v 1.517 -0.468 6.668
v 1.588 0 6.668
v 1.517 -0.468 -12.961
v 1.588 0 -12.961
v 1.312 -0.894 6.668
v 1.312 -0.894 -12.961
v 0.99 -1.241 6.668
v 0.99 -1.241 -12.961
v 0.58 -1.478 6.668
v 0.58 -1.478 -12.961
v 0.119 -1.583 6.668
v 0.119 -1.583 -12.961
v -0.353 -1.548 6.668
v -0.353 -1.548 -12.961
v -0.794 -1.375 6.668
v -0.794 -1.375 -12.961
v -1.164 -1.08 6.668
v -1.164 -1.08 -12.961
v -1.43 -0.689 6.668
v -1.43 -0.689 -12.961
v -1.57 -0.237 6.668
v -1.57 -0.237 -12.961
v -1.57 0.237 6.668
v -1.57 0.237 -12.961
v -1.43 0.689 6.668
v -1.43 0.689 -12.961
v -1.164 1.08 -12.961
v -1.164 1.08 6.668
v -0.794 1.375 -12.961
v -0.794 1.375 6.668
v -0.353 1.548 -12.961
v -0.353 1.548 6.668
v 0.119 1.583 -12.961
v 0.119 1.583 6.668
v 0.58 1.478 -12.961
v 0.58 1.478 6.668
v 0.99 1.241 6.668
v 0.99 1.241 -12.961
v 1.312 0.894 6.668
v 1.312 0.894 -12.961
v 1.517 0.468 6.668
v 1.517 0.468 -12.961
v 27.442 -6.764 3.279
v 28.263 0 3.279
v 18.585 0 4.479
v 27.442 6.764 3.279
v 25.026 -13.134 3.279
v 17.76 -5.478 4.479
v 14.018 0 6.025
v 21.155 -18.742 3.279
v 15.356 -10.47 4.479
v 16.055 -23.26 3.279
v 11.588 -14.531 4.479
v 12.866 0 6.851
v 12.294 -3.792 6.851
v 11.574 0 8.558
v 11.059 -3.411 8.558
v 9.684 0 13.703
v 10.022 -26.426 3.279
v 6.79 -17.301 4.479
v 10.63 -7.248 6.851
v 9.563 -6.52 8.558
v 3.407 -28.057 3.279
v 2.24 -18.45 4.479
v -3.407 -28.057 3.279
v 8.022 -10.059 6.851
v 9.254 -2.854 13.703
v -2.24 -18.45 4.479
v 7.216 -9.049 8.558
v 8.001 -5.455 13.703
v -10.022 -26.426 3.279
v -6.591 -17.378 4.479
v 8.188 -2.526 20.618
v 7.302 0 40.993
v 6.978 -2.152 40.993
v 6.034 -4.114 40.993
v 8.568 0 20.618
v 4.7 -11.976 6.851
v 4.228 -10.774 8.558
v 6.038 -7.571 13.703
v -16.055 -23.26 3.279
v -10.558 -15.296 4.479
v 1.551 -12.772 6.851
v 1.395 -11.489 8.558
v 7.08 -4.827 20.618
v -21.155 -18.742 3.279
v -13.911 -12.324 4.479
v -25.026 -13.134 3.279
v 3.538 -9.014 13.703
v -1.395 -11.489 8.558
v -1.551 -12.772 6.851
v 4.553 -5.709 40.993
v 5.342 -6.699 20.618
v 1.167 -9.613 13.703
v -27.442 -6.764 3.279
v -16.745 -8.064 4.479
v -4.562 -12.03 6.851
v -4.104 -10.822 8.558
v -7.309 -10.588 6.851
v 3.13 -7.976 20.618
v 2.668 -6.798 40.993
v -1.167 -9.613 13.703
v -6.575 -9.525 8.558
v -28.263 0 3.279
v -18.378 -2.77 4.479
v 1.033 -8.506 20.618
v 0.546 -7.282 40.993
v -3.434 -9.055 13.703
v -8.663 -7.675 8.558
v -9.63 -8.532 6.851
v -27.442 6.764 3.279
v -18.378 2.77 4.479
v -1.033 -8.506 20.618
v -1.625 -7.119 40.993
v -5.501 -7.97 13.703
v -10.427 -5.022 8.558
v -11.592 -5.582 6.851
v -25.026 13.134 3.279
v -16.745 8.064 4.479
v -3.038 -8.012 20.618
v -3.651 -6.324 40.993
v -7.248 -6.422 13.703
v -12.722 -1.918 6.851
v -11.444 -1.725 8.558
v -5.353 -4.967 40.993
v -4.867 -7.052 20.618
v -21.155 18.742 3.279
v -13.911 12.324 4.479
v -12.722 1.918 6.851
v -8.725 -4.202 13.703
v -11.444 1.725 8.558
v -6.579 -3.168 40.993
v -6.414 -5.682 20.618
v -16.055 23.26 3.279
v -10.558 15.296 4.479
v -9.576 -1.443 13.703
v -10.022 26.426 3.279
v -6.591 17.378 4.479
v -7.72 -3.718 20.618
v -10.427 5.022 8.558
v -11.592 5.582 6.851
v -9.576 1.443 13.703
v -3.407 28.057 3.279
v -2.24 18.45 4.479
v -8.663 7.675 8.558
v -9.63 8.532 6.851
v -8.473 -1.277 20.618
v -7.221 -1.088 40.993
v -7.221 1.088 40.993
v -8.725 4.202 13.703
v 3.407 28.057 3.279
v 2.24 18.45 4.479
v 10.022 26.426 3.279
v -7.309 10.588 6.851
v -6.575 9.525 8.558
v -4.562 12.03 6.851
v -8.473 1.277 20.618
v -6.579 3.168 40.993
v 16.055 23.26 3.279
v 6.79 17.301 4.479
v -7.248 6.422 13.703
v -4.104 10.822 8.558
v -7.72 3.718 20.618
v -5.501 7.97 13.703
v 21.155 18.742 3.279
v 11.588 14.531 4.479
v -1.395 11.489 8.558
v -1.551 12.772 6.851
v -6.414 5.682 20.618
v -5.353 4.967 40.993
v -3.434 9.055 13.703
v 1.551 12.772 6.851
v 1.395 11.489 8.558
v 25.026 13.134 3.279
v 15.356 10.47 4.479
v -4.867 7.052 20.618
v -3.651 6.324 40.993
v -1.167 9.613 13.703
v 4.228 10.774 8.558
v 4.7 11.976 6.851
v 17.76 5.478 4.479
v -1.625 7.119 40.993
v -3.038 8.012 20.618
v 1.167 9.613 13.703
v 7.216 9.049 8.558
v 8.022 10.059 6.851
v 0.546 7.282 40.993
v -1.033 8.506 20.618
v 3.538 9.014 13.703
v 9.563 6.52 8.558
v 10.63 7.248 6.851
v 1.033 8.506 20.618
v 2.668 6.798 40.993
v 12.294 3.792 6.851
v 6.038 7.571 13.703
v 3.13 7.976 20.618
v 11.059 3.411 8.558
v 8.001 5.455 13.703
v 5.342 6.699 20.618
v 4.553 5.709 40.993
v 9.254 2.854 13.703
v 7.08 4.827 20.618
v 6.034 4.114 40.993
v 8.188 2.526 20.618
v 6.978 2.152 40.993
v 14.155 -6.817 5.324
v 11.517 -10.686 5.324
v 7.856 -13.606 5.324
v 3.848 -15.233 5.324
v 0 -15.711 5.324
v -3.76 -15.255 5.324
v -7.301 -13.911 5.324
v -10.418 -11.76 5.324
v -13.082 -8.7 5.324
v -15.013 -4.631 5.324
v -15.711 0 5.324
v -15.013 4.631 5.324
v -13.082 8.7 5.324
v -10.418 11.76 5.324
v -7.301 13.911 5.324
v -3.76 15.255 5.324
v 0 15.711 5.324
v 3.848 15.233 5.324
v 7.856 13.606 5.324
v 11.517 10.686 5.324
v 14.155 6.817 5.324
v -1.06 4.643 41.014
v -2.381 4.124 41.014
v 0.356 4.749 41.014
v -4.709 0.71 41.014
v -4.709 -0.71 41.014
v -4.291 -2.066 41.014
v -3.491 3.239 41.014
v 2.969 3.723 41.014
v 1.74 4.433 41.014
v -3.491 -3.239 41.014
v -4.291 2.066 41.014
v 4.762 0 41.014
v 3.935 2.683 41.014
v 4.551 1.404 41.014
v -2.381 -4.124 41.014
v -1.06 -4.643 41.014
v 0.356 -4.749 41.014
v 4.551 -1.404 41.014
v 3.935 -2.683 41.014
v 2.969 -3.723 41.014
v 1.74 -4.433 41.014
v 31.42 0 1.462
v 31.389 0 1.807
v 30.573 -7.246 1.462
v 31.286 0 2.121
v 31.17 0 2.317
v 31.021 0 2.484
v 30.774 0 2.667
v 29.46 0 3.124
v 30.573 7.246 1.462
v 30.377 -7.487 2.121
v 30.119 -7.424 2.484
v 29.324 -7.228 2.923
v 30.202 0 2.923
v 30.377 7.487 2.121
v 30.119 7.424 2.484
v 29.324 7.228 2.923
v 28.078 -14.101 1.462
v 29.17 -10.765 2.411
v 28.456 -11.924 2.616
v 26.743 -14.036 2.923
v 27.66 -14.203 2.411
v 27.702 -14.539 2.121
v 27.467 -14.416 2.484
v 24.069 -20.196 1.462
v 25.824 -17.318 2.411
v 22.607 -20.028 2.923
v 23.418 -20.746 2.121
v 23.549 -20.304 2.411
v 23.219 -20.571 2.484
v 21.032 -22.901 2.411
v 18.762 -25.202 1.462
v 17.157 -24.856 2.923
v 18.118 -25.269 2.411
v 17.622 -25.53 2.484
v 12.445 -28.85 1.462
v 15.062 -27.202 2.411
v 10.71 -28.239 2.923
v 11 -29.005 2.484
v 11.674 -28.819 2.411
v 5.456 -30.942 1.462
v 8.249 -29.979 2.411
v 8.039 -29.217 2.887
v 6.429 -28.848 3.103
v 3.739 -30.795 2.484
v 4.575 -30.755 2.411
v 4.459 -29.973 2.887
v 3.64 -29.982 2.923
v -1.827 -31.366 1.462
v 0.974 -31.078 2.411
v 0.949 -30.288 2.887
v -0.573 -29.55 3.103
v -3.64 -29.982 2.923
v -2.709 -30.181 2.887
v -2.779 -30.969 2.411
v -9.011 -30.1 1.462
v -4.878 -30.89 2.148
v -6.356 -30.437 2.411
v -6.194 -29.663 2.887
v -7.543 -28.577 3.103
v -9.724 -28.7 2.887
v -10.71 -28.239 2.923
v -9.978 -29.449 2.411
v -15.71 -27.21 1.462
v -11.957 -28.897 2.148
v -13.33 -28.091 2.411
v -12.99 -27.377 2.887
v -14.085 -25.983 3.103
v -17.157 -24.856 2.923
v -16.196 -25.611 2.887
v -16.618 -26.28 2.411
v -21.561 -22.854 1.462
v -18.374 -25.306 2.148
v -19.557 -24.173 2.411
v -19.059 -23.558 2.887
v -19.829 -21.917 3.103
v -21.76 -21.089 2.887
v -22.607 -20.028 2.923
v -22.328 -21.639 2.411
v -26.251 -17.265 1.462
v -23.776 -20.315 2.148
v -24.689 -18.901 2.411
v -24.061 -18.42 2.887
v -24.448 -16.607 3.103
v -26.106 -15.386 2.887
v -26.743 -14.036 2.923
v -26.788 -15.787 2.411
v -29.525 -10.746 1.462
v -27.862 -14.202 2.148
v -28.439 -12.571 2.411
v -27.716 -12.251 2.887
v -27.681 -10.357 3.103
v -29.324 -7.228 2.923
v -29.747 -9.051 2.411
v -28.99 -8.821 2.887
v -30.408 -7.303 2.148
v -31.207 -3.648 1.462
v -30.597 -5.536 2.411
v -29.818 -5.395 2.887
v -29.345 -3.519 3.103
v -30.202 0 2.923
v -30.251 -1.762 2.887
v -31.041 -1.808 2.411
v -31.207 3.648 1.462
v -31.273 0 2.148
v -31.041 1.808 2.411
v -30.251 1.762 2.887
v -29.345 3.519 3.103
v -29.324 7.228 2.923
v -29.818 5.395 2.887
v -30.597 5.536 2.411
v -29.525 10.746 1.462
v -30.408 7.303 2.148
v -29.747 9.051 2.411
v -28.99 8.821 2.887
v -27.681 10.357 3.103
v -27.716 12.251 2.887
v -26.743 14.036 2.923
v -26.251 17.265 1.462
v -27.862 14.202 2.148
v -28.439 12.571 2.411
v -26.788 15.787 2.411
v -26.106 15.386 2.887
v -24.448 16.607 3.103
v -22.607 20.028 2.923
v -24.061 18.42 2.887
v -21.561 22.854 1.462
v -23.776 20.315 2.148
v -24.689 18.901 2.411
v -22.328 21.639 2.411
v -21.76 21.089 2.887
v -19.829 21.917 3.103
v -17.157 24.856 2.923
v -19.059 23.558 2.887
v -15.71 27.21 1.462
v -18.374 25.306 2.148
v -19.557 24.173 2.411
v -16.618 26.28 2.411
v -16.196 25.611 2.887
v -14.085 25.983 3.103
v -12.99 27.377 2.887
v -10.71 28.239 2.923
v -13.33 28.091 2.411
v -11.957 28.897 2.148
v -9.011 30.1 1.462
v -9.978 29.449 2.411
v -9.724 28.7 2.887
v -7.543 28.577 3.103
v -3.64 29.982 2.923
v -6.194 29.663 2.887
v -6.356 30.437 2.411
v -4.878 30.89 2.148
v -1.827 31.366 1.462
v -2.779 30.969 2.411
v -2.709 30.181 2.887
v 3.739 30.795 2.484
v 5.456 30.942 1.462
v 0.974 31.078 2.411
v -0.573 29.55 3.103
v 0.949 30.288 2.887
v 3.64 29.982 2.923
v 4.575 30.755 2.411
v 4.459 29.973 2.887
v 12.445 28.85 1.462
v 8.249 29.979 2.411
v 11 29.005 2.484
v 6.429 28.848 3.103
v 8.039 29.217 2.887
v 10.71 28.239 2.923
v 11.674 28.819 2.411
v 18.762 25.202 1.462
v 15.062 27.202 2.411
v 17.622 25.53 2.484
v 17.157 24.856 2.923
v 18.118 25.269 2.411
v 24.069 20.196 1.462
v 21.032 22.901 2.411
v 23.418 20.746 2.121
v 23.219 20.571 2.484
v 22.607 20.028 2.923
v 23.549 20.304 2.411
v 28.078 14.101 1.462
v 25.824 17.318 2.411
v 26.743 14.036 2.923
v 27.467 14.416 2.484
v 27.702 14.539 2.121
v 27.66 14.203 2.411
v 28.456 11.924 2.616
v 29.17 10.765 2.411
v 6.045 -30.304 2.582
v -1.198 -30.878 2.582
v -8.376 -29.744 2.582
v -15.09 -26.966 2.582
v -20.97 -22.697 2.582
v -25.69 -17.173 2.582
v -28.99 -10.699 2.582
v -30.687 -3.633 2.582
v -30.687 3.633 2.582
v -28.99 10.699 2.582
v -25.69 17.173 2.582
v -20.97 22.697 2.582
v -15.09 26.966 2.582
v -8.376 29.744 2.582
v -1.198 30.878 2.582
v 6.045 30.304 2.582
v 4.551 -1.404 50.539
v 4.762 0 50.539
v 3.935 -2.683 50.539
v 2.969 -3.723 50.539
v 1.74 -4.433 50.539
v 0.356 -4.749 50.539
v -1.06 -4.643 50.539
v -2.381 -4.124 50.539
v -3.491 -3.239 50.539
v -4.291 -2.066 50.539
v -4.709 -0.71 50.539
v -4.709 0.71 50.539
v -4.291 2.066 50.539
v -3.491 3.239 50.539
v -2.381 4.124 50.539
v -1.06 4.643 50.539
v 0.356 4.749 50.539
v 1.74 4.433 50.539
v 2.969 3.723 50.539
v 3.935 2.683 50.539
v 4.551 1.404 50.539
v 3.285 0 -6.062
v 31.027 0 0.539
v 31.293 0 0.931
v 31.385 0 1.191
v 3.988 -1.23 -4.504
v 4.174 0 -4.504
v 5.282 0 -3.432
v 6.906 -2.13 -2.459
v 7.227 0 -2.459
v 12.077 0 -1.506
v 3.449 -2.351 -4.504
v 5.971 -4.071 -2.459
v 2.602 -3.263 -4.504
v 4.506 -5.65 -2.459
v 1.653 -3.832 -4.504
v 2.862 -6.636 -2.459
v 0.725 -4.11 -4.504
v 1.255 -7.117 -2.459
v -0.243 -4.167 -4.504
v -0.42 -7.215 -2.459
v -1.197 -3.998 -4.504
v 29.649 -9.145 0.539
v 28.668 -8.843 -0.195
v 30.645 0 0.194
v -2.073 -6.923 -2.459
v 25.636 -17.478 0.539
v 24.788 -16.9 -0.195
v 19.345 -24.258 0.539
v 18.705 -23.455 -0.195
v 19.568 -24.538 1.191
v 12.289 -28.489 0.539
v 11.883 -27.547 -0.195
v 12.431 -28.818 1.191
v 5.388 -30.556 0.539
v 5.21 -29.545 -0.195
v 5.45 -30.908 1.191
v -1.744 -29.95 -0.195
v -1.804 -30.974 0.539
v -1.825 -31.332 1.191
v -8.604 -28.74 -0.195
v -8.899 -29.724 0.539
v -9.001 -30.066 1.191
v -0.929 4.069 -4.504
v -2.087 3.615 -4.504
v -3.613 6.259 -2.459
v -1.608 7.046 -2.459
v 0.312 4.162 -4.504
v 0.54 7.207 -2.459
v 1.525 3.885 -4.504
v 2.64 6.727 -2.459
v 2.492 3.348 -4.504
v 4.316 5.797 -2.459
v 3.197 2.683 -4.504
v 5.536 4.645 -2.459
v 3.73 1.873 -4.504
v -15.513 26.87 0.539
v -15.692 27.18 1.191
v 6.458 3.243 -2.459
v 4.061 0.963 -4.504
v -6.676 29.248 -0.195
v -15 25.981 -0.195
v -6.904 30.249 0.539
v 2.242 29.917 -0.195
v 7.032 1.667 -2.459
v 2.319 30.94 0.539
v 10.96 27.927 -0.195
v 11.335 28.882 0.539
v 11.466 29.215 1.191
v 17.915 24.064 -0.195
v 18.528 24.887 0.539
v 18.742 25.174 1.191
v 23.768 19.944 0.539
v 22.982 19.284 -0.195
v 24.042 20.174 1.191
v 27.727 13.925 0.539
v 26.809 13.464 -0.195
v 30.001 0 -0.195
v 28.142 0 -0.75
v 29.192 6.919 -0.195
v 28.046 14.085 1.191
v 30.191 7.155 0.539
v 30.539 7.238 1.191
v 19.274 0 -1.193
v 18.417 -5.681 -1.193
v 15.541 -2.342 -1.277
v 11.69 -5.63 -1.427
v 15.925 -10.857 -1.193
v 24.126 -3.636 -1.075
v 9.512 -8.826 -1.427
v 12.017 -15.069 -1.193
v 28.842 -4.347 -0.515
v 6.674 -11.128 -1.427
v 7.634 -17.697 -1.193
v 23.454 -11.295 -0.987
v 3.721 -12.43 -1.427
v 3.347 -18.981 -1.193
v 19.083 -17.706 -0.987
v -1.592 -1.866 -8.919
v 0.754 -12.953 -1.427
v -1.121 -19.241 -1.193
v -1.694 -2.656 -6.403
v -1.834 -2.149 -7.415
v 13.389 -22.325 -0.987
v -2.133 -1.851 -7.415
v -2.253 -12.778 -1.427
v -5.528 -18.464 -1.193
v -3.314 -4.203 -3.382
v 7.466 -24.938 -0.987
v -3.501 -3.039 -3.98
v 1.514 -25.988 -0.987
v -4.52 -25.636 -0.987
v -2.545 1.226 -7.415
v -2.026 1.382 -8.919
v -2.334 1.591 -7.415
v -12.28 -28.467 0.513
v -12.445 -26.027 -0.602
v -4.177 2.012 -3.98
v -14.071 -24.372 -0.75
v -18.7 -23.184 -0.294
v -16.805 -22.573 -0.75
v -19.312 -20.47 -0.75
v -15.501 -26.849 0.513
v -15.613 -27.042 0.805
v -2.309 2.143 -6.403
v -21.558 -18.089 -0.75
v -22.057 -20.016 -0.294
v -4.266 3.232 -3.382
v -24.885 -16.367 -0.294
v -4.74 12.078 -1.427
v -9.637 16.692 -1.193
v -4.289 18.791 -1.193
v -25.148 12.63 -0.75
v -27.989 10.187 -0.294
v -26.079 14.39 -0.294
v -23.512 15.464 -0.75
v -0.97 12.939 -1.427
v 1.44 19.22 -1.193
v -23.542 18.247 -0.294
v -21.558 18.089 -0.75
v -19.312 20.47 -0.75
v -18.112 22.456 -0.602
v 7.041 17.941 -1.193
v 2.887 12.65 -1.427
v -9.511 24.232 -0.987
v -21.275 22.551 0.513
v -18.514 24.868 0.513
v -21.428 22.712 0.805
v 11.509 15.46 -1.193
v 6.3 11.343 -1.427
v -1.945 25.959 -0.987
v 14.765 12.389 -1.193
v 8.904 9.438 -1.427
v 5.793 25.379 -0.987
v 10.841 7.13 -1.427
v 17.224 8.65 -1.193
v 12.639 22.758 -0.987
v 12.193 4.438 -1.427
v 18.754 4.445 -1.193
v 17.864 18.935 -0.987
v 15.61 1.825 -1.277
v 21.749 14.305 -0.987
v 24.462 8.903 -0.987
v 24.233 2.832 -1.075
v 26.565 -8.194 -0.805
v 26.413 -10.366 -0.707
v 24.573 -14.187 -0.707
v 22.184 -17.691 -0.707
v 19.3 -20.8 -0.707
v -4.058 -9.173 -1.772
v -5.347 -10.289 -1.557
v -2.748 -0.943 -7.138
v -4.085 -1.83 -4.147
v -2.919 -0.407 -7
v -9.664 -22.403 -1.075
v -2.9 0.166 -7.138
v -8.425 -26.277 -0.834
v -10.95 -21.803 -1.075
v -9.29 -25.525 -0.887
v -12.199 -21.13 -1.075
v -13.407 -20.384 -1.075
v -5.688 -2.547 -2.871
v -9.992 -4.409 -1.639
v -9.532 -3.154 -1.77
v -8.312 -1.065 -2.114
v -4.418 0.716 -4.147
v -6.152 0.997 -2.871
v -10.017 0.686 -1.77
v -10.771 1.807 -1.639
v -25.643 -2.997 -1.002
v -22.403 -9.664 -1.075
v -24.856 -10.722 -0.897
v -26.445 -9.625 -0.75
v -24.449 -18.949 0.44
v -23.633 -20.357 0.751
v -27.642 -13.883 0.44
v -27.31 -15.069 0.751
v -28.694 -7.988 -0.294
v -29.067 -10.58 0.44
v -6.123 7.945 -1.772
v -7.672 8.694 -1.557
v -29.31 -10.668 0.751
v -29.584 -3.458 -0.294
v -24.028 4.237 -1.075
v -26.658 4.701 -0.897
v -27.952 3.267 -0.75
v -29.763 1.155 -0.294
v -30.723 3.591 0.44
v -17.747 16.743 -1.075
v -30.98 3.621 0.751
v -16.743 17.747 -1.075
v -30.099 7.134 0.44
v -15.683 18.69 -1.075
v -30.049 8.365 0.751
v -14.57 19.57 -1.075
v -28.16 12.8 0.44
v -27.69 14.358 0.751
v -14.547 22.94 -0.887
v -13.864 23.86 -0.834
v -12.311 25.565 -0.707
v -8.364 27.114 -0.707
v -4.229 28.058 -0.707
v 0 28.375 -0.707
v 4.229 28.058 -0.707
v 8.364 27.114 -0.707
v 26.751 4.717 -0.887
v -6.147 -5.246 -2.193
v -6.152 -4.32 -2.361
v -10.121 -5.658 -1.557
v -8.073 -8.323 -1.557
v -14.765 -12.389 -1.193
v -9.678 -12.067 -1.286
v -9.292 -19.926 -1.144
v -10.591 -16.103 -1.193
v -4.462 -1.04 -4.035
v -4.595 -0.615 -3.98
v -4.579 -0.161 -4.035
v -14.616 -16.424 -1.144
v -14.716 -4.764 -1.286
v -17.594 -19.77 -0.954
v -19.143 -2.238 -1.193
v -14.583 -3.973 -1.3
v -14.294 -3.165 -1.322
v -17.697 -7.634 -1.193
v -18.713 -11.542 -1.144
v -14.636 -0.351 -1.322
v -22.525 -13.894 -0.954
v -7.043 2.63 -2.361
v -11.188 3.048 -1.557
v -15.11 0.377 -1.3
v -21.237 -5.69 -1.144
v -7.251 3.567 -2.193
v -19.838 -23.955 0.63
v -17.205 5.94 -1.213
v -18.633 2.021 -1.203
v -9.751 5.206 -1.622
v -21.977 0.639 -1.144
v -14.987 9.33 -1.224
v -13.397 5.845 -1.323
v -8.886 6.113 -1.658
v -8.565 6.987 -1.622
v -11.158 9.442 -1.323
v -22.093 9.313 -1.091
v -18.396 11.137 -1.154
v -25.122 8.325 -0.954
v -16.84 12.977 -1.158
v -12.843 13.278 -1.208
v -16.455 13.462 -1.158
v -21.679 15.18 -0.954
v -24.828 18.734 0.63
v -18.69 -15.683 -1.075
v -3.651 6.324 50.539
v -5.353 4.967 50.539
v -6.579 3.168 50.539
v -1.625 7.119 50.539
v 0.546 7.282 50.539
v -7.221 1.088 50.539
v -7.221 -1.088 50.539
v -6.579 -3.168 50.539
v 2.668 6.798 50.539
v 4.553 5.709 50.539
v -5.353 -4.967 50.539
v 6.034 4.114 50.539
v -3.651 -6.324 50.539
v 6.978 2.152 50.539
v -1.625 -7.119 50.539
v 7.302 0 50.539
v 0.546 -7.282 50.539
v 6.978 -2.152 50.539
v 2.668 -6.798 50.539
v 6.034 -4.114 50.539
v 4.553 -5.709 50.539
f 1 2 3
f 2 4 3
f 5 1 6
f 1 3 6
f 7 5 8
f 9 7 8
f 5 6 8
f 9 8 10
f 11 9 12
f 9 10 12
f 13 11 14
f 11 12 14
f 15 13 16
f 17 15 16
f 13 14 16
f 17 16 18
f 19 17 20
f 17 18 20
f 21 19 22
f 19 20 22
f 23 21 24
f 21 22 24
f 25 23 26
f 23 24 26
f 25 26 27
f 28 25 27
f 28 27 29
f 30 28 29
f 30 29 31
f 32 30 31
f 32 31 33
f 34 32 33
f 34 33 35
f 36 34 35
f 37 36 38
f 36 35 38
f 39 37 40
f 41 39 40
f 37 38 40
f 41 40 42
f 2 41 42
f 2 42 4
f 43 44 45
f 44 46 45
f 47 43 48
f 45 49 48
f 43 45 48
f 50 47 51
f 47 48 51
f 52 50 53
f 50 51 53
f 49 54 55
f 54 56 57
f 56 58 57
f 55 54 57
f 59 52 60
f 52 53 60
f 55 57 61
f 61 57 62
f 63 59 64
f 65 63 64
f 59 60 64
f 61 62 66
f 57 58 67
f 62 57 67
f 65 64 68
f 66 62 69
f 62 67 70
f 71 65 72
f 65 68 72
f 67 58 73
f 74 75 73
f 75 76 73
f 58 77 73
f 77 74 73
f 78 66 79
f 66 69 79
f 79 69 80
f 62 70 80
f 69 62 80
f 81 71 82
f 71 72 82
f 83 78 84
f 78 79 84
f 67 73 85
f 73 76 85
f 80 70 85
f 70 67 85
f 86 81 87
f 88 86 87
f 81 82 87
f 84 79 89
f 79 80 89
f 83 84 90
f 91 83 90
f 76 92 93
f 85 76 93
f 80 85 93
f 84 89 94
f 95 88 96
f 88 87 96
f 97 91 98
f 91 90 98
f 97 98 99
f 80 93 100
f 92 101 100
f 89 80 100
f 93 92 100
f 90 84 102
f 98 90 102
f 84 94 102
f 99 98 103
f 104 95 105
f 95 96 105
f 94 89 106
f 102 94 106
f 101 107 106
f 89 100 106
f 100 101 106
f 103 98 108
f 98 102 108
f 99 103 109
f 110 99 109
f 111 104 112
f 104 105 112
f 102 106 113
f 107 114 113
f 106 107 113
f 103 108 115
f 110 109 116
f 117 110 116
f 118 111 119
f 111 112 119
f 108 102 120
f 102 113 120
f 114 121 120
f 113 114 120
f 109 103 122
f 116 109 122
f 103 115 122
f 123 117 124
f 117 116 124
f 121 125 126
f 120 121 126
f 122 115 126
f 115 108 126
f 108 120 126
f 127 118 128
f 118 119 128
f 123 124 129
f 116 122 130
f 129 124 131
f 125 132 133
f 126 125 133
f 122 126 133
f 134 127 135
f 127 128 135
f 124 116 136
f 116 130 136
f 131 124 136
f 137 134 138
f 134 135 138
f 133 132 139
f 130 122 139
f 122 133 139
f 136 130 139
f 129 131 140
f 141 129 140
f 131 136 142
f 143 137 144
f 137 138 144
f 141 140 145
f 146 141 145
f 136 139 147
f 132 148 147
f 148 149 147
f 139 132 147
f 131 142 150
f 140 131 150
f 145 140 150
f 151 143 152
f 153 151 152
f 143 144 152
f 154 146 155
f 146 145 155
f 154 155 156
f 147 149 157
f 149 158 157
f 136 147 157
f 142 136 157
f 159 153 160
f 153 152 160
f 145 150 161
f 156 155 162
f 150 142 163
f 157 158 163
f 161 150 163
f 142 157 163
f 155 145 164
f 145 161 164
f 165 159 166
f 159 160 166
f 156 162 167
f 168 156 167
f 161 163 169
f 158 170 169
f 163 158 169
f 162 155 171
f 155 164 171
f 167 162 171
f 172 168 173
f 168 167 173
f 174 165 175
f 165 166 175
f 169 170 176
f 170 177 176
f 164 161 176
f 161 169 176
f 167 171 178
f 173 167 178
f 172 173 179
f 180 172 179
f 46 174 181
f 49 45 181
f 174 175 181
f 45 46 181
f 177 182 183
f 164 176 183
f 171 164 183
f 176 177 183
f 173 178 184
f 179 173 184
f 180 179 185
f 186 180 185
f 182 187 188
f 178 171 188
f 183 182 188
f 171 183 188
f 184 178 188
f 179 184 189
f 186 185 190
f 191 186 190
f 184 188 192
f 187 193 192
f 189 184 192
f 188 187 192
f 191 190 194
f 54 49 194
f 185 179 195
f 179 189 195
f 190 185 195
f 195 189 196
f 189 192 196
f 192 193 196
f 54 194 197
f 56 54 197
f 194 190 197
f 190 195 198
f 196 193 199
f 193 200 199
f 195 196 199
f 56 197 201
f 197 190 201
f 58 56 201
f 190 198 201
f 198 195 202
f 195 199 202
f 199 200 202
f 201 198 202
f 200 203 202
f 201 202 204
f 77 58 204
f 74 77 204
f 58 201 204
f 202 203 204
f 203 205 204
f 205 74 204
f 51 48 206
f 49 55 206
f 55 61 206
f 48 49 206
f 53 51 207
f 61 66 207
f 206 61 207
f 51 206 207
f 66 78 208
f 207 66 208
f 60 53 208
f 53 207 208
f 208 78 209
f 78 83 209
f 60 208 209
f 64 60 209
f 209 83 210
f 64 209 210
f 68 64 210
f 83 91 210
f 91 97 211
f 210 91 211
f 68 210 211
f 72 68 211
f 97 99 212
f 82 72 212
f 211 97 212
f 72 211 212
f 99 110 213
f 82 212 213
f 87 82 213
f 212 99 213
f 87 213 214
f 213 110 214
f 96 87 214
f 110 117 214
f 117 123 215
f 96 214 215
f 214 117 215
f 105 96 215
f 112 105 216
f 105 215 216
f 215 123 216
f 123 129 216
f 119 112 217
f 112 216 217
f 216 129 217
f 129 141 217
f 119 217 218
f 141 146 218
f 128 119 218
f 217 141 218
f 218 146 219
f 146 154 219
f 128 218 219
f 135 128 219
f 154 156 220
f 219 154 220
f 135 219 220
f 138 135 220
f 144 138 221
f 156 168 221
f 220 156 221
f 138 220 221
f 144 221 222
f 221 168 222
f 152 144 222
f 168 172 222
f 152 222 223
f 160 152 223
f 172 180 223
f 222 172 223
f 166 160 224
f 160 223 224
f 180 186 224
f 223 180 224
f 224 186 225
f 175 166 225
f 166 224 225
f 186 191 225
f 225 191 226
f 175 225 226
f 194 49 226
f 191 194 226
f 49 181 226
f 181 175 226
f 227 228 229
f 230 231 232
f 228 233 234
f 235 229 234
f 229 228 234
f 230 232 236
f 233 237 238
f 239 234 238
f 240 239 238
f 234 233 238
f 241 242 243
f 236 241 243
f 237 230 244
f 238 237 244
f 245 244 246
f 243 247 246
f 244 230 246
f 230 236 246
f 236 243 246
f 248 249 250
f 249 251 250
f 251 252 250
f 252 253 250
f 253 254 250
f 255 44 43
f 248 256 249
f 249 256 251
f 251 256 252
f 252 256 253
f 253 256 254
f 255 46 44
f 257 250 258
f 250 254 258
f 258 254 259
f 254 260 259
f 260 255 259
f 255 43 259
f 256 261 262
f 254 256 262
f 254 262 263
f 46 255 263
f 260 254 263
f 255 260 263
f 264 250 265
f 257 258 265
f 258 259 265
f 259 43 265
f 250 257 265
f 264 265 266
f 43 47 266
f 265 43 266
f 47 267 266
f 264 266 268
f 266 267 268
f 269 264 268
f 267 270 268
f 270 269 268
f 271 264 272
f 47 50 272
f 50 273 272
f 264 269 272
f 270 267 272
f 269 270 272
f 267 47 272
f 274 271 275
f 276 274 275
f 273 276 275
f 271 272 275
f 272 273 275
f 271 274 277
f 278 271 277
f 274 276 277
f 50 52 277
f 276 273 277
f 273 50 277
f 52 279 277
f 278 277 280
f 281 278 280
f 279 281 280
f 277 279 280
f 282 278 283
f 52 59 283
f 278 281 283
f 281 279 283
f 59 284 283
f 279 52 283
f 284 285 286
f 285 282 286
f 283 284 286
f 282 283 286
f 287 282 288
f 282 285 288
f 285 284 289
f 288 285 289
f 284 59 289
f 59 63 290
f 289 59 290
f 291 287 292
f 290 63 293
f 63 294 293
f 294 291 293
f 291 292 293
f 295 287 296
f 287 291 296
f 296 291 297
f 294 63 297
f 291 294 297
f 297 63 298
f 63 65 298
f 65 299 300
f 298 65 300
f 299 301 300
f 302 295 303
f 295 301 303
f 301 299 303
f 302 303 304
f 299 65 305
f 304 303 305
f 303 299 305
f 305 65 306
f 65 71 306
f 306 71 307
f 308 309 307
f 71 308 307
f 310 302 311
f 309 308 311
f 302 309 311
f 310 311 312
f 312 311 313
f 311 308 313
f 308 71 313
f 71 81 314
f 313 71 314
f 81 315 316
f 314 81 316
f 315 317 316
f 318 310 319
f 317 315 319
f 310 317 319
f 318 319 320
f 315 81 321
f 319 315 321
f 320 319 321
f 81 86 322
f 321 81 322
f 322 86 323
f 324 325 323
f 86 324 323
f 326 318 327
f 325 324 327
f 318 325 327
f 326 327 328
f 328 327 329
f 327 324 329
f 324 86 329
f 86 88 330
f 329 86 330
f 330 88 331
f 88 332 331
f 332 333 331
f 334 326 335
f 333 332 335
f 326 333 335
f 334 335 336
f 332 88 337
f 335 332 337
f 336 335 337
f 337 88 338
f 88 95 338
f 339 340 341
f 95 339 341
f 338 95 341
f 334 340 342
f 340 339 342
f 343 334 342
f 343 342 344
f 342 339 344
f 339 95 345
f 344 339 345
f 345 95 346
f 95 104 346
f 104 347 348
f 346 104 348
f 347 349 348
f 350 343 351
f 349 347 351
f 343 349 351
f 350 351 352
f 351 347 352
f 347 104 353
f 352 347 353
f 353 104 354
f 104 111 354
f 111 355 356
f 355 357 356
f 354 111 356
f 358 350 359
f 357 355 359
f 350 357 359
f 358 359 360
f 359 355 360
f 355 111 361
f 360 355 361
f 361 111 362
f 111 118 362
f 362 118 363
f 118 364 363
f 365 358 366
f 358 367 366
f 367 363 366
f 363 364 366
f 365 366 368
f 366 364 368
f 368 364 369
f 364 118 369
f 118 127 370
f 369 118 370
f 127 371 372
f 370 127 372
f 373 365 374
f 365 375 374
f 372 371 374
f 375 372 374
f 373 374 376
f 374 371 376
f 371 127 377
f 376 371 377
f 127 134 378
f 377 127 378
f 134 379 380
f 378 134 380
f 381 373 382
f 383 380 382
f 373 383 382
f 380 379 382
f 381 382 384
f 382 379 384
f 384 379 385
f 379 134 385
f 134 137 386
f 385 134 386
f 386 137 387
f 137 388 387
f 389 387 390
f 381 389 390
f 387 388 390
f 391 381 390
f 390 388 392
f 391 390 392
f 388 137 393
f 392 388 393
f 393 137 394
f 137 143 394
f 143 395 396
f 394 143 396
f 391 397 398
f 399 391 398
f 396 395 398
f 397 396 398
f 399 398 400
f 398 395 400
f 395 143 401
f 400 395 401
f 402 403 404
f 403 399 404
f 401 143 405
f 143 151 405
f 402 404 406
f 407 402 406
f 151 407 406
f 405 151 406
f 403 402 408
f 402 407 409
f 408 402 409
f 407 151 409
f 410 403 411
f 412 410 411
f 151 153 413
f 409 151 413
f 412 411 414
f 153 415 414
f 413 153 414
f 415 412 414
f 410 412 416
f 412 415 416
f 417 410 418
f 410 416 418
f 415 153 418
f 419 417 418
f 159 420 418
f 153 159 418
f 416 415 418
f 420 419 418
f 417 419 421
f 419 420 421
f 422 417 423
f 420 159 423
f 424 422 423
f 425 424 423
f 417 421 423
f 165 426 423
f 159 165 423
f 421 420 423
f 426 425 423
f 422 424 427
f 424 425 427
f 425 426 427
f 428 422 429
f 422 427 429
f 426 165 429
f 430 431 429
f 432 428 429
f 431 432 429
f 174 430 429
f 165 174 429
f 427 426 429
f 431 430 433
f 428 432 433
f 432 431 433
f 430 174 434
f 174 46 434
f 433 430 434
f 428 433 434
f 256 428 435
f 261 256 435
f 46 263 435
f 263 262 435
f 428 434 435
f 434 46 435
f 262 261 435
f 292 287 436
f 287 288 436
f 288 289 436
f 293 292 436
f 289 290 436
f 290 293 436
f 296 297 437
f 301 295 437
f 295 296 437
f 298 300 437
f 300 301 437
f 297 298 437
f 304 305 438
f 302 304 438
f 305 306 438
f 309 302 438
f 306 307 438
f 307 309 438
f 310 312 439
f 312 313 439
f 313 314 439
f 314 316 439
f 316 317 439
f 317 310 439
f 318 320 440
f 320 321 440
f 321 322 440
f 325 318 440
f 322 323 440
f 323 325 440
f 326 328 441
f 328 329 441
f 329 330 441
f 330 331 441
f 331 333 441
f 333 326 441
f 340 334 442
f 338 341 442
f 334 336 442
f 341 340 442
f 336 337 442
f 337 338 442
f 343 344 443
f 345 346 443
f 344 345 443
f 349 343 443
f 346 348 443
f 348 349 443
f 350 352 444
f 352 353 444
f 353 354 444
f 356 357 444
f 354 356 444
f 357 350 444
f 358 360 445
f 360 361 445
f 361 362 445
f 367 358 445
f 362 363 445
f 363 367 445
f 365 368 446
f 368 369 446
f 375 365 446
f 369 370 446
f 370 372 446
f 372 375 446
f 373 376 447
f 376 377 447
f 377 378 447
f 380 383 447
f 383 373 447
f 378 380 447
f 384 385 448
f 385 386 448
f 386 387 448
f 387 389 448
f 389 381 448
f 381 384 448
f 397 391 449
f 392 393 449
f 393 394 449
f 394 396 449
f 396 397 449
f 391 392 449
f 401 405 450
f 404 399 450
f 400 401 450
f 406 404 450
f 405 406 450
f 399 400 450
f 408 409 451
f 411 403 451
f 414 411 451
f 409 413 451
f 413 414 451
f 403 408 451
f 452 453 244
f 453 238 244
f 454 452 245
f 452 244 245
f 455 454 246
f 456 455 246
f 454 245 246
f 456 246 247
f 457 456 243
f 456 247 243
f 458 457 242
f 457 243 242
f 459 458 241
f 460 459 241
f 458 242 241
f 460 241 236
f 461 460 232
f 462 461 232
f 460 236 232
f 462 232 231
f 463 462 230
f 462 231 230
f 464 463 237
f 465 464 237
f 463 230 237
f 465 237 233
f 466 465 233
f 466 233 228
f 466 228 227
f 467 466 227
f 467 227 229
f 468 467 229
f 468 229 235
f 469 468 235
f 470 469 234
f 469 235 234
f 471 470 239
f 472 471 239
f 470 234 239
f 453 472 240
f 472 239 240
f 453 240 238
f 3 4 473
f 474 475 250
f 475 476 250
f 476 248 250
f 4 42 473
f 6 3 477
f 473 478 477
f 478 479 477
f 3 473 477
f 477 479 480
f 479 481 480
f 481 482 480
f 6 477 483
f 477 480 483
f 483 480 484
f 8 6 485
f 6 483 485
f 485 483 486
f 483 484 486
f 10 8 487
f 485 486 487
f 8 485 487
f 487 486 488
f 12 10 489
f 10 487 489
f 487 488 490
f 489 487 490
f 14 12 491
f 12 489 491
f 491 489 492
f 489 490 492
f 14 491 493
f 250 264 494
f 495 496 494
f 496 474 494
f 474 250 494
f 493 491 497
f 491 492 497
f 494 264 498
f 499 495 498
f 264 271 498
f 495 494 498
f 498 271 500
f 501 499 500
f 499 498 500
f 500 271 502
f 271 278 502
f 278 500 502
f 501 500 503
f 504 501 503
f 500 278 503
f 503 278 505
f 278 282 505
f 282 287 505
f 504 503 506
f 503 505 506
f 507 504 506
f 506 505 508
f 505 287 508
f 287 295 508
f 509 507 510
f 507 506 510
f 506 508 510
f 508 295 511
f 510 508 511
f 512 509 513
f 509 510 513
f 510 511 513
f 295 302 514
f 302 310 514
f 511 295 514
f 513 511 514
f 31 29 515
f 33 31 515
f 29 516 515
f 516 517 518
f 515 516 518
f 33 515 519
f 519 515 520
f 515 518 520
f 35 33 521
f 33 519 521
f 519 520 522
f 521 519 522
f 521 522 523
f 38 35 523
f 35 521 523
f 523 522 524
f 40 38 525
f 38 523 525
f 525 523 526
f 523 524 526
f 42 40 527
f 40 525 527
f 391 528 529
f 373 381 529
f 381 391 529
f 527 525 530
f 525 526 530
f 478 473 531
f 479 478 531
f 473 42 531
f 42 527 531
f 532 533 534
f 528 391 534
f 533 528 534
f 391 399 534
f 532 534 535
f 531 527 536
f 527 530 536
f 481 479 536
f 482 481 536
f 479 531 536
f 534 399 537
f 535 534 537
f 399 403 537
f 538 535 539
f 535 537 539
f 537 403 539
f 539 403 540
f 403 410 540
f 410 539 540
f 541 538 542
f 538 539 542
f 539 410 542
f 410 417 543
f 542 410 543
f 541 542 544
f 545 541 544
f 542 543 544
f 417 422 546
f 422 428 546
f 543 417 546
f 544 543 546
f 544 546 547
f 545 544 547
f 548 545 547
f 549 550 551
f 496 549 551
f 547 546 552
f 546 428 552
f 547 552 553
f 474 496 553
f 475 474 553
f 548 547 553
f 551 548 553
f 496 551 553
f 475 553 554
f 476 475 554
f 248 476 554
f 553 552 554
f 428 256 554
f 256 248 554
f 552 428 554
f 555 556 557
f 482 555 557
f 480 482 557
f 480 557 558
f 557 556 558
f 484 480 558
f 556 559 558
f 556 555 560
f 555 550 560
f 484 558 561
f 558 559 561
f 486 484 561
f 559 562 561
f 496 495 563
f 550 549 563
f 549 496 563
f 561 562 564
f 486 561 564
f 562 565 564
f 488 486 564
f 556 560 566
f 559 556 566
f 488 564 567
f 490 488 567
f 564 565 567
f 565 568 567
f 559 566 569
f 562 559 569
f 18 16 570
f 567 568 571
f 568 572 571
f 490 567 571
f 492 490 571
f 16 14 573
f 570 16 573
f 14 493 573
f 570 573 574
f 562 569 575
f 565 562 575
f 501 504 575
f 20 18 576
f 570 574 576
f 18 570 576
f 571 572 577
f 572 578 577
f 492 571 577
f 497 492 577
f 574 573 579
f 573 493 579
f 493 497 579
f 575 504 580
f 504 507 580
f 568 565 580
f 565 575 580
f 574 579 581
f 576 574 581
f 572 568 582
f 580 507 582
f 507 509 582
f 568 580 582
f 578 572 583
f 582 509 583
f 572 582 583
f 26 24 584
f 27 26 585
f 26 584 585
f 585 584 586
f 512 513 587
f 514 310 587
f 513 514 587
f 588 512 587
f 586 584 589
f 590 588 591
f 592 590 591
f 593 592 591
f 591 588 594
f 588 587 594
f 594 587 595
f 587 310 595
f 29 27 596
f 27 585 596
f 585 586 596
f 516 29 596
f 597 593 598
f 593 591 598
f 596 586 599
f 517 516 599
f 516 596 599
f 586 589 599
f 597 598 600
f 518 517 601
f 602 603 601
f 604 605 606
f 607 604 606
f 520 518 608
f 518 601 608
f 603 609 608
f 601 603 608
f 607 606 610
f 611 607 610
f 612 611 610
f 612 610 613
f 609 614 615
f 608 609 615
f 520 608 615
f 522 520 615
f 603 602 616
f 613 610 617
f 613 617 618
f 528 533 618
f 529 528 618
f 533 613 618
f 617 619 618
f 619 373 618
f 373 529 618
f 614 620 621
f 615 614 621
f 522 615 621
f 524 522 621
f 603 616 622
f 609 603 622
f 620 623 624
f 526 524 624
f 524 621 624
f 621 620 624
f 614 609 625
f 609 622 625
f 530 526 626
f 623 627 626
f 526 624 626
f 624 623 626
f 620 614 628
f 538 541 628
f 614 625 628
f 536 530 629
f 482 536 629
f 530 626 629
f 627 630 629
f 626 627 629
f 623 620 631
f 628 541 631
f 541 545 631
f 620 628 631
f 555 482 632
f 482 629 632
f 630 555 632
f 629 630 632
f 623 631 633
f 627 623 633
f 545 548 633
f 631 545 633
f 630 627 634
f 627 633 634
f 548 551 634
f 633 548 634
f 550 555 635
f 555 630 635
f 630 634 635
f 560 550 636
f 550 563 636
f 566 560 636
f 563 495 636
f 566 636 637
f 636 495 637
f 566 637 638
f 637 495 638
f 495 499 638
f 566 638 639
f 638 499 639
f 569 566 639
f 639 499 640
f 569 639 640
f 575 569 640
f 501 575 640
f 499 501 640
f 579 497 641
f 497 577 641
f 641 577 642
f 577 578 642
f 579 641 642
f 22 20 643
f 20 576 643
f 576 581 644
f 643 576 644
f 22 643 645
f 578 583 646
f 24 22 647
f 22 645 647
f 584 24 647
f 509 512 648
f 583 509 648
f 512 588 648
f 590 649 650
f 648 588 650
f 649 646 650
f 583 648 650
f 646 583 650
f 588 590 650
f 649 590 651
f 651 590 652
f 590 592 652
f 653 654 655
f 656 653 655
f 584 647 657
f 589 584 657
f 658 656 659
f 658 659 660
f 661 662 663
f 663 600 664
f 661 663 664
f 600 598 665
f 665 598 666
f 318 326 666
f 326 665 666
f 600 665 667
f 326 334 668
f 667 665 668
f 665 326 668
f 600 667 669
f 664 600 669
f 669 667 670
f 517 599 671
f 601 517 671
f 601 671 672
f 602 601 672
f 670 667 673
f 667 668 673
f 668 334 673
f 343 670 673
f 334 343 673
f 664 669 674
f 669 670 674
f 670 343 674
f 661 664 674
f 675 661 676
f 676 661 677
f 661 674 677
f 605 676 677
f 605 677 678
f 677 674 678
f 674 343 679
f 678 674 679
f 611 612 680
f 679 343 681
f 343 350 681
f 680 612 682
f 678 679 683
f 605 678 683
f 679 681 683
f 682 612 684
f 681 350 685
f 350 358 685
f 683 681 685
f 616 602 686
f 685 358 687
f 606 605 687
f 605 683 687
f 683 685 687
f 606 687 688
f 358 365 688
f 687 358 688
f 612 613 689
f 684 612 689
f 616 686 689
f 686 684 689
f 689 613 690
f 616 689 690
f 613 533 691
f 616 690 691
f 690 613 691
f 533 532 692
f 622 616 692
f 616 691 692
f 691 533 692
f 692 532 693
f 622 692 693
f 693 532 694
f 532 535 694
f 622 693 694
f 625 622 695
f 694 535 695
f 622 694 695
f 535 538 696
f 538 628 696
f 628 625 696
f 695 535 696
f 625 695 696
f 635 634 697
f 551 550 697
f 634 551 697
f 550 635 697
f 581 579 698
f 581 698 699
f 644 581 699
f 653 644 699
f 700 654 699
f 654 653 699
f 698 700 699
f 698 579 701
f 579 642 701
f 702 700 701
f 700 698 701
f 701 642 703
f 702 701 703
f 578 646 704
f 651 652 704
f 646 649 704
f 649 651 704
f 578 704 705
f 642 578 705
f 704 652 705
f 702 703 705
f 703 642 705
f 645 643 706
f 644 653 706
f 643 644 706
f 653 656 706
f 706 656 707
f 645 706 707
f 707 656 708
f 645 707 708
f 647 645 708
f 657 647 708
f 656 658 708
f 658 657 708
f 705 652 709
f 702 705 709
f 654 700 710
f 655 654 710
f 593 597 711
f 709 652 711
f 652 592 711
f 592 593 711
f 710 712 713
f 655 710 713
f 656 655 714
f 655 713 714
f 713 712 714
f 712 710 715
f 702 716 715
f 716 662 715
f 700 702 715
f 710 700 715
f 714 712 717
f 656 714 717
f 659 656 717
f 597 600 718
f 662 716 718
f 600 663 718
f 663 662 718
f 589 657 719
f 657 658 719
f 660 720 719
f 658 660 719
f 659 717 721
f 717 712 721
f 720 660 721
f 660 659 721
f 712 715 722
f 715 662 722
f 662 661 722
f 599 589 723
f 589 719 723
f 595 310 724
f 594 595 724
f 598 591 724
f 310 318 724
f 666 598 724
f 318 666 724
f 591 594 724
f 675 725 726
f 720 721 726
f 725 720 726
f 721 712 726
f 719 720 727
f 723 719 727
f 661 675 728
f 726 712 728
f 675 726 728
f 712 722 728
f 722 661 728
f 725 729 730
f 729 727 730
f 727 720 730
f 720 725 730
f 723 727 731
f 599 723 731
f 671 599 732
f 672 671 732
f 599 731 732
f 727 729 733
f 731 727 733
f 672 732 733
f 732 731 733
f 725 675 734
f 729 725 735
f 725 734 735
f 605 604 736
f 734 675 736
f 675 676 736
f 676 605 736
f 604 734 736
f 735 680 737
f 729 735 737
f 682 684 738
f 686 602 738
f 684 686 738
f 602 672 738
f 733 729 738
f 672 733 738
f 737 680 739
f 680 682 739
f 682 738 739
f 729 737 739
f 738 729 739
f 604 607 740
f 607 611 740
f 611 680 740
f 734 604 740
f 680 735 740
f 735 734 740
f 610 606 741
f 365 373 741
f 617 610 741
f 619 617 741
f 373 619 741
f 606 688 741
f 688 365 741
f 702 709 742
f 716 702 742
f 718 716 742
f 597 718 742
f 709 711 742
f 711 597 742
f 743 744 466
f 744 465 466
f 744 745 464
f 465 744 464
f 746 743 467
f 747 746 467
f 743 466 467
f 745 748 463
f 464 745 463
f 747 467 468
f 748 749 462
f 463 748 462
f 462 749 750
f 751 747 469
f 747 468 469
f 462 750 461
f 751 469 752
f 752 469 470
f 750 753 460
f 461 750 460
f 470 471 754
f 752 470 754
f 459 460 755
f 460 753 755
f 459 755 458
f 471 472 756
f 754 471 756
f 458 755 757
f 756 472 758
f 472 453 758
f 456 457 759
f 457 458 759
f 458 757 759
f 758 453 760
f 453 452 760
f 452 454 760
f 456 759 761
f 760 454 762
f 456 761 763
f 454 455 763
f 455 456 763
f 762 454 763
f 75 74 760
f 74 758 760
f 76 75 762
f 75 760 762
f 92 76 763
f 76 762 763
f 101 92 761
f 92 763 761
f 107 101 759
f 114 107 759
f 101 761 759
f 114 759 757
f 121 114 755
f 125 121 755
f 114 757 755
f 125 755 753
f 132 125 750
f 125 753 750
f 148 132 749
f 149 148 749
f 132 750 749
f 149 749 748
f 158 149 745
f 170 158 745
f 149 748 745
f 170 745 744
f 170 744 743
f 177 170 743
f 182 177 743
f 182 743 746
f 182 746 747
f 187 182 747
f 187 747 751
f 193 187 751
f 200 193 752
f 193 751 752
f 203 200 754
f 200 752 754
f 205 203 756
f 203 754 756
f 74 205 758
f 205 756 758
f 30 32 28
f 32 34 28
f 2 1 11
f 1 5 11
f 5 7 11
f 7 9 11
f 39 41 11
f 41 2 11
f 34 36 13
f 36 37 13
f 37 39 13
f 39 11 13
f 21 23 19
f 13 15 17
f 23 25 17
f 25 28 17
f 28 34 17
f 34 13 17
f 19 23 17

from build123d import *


with BuildPart() as f1:
    # F0 (on Front) → F1 (revolve)
    with BuildSketch(Plane.XZ):
        with BuildLine():
            Line((1.5875, 6.667825859), (1.5875, -12.9610260137))
            add(Edge.make_bspline(
                [(1.5875, -12.9610260137), (1.8724662747, -11.5686269888), (2.4845312419, -8.5779619908), (4.3063683854, -1.5815812013), (18.4278924431, -1.1535487248), (27.4095754611, -1.111245668), (30.3098711883, -0.2068596228), (31.3225043371, 0.7573851032), (31.4157204905, 1.3347212449), (31.4195560348, 1.4616048976)],
                knots=[0, 0, 0, 0, 0.1137599478, 0.2443393653, 0.4401724208, 0.6049852319, 0.6936657727, 0.7589791665, 0.7774982507, 0.7774982507, 0.7774982507, 0.7774982507], degree=3))
            add(Edge.make_bspline(
                [(31.4195560348, 1.4616048976), (31.427416239, 1.7216283354), (31.27992505, 2.3286648069), (30.573937311, 2.8565264178), (29.2405122483, 3.2049277973), (28.4112141117, 3.2738227195), (28.2629951835, 3.2793318387)],
                knots=[0.7774982507, 0.7774982507, 0.7774982507, 0.7774982507, 0.815449522, 0.8670419918, 0.9318776982, 0.9830086816, 0.9830086816, 0.9830086816, 0.9830086816], degree=3))
            add(Edge.make_bspline(
                [(28.2629951835, 3.2793318387), (25.3626970462, 3.4969143487), (20.4471896826, 3.8656793444), (16.7680467922, 5.0182870398), (12.3756029704, 6.2735634545), (9.8080422623, 12.2651864706), (8.2705298078, 20.6424053735), (7.6697151065, 33.2729418333), (7.3025, 40.9926660359)],
                knots=[0, 0, 0, 0, 0.1688196751, 0.2861203631, 0.4074464551, 0.552155039, 0.726279276, 1, 1, 1, 1], degree=3))
            Line((7.3025, 40.9926660359), (7.3025, 50.5389739863))
            Line((7.3025, 50.5389739863), (4.7625, 50.5389739863))
            Line((4.7625, 50.5389739863), (4.7625, 41.0139739863))
            Line((4.7625, 41.0139739863), (0, 41.0139739863))
            Line((0, 41.0139739863), (0, 6.667825859))
            Line((0, 6.667825859), (1.5875, 6.667825859))
        make_face()
    revolve(axis=Axis((0, 0, 23.8408999226), (0, 0, -1)))


solid = f1.part
